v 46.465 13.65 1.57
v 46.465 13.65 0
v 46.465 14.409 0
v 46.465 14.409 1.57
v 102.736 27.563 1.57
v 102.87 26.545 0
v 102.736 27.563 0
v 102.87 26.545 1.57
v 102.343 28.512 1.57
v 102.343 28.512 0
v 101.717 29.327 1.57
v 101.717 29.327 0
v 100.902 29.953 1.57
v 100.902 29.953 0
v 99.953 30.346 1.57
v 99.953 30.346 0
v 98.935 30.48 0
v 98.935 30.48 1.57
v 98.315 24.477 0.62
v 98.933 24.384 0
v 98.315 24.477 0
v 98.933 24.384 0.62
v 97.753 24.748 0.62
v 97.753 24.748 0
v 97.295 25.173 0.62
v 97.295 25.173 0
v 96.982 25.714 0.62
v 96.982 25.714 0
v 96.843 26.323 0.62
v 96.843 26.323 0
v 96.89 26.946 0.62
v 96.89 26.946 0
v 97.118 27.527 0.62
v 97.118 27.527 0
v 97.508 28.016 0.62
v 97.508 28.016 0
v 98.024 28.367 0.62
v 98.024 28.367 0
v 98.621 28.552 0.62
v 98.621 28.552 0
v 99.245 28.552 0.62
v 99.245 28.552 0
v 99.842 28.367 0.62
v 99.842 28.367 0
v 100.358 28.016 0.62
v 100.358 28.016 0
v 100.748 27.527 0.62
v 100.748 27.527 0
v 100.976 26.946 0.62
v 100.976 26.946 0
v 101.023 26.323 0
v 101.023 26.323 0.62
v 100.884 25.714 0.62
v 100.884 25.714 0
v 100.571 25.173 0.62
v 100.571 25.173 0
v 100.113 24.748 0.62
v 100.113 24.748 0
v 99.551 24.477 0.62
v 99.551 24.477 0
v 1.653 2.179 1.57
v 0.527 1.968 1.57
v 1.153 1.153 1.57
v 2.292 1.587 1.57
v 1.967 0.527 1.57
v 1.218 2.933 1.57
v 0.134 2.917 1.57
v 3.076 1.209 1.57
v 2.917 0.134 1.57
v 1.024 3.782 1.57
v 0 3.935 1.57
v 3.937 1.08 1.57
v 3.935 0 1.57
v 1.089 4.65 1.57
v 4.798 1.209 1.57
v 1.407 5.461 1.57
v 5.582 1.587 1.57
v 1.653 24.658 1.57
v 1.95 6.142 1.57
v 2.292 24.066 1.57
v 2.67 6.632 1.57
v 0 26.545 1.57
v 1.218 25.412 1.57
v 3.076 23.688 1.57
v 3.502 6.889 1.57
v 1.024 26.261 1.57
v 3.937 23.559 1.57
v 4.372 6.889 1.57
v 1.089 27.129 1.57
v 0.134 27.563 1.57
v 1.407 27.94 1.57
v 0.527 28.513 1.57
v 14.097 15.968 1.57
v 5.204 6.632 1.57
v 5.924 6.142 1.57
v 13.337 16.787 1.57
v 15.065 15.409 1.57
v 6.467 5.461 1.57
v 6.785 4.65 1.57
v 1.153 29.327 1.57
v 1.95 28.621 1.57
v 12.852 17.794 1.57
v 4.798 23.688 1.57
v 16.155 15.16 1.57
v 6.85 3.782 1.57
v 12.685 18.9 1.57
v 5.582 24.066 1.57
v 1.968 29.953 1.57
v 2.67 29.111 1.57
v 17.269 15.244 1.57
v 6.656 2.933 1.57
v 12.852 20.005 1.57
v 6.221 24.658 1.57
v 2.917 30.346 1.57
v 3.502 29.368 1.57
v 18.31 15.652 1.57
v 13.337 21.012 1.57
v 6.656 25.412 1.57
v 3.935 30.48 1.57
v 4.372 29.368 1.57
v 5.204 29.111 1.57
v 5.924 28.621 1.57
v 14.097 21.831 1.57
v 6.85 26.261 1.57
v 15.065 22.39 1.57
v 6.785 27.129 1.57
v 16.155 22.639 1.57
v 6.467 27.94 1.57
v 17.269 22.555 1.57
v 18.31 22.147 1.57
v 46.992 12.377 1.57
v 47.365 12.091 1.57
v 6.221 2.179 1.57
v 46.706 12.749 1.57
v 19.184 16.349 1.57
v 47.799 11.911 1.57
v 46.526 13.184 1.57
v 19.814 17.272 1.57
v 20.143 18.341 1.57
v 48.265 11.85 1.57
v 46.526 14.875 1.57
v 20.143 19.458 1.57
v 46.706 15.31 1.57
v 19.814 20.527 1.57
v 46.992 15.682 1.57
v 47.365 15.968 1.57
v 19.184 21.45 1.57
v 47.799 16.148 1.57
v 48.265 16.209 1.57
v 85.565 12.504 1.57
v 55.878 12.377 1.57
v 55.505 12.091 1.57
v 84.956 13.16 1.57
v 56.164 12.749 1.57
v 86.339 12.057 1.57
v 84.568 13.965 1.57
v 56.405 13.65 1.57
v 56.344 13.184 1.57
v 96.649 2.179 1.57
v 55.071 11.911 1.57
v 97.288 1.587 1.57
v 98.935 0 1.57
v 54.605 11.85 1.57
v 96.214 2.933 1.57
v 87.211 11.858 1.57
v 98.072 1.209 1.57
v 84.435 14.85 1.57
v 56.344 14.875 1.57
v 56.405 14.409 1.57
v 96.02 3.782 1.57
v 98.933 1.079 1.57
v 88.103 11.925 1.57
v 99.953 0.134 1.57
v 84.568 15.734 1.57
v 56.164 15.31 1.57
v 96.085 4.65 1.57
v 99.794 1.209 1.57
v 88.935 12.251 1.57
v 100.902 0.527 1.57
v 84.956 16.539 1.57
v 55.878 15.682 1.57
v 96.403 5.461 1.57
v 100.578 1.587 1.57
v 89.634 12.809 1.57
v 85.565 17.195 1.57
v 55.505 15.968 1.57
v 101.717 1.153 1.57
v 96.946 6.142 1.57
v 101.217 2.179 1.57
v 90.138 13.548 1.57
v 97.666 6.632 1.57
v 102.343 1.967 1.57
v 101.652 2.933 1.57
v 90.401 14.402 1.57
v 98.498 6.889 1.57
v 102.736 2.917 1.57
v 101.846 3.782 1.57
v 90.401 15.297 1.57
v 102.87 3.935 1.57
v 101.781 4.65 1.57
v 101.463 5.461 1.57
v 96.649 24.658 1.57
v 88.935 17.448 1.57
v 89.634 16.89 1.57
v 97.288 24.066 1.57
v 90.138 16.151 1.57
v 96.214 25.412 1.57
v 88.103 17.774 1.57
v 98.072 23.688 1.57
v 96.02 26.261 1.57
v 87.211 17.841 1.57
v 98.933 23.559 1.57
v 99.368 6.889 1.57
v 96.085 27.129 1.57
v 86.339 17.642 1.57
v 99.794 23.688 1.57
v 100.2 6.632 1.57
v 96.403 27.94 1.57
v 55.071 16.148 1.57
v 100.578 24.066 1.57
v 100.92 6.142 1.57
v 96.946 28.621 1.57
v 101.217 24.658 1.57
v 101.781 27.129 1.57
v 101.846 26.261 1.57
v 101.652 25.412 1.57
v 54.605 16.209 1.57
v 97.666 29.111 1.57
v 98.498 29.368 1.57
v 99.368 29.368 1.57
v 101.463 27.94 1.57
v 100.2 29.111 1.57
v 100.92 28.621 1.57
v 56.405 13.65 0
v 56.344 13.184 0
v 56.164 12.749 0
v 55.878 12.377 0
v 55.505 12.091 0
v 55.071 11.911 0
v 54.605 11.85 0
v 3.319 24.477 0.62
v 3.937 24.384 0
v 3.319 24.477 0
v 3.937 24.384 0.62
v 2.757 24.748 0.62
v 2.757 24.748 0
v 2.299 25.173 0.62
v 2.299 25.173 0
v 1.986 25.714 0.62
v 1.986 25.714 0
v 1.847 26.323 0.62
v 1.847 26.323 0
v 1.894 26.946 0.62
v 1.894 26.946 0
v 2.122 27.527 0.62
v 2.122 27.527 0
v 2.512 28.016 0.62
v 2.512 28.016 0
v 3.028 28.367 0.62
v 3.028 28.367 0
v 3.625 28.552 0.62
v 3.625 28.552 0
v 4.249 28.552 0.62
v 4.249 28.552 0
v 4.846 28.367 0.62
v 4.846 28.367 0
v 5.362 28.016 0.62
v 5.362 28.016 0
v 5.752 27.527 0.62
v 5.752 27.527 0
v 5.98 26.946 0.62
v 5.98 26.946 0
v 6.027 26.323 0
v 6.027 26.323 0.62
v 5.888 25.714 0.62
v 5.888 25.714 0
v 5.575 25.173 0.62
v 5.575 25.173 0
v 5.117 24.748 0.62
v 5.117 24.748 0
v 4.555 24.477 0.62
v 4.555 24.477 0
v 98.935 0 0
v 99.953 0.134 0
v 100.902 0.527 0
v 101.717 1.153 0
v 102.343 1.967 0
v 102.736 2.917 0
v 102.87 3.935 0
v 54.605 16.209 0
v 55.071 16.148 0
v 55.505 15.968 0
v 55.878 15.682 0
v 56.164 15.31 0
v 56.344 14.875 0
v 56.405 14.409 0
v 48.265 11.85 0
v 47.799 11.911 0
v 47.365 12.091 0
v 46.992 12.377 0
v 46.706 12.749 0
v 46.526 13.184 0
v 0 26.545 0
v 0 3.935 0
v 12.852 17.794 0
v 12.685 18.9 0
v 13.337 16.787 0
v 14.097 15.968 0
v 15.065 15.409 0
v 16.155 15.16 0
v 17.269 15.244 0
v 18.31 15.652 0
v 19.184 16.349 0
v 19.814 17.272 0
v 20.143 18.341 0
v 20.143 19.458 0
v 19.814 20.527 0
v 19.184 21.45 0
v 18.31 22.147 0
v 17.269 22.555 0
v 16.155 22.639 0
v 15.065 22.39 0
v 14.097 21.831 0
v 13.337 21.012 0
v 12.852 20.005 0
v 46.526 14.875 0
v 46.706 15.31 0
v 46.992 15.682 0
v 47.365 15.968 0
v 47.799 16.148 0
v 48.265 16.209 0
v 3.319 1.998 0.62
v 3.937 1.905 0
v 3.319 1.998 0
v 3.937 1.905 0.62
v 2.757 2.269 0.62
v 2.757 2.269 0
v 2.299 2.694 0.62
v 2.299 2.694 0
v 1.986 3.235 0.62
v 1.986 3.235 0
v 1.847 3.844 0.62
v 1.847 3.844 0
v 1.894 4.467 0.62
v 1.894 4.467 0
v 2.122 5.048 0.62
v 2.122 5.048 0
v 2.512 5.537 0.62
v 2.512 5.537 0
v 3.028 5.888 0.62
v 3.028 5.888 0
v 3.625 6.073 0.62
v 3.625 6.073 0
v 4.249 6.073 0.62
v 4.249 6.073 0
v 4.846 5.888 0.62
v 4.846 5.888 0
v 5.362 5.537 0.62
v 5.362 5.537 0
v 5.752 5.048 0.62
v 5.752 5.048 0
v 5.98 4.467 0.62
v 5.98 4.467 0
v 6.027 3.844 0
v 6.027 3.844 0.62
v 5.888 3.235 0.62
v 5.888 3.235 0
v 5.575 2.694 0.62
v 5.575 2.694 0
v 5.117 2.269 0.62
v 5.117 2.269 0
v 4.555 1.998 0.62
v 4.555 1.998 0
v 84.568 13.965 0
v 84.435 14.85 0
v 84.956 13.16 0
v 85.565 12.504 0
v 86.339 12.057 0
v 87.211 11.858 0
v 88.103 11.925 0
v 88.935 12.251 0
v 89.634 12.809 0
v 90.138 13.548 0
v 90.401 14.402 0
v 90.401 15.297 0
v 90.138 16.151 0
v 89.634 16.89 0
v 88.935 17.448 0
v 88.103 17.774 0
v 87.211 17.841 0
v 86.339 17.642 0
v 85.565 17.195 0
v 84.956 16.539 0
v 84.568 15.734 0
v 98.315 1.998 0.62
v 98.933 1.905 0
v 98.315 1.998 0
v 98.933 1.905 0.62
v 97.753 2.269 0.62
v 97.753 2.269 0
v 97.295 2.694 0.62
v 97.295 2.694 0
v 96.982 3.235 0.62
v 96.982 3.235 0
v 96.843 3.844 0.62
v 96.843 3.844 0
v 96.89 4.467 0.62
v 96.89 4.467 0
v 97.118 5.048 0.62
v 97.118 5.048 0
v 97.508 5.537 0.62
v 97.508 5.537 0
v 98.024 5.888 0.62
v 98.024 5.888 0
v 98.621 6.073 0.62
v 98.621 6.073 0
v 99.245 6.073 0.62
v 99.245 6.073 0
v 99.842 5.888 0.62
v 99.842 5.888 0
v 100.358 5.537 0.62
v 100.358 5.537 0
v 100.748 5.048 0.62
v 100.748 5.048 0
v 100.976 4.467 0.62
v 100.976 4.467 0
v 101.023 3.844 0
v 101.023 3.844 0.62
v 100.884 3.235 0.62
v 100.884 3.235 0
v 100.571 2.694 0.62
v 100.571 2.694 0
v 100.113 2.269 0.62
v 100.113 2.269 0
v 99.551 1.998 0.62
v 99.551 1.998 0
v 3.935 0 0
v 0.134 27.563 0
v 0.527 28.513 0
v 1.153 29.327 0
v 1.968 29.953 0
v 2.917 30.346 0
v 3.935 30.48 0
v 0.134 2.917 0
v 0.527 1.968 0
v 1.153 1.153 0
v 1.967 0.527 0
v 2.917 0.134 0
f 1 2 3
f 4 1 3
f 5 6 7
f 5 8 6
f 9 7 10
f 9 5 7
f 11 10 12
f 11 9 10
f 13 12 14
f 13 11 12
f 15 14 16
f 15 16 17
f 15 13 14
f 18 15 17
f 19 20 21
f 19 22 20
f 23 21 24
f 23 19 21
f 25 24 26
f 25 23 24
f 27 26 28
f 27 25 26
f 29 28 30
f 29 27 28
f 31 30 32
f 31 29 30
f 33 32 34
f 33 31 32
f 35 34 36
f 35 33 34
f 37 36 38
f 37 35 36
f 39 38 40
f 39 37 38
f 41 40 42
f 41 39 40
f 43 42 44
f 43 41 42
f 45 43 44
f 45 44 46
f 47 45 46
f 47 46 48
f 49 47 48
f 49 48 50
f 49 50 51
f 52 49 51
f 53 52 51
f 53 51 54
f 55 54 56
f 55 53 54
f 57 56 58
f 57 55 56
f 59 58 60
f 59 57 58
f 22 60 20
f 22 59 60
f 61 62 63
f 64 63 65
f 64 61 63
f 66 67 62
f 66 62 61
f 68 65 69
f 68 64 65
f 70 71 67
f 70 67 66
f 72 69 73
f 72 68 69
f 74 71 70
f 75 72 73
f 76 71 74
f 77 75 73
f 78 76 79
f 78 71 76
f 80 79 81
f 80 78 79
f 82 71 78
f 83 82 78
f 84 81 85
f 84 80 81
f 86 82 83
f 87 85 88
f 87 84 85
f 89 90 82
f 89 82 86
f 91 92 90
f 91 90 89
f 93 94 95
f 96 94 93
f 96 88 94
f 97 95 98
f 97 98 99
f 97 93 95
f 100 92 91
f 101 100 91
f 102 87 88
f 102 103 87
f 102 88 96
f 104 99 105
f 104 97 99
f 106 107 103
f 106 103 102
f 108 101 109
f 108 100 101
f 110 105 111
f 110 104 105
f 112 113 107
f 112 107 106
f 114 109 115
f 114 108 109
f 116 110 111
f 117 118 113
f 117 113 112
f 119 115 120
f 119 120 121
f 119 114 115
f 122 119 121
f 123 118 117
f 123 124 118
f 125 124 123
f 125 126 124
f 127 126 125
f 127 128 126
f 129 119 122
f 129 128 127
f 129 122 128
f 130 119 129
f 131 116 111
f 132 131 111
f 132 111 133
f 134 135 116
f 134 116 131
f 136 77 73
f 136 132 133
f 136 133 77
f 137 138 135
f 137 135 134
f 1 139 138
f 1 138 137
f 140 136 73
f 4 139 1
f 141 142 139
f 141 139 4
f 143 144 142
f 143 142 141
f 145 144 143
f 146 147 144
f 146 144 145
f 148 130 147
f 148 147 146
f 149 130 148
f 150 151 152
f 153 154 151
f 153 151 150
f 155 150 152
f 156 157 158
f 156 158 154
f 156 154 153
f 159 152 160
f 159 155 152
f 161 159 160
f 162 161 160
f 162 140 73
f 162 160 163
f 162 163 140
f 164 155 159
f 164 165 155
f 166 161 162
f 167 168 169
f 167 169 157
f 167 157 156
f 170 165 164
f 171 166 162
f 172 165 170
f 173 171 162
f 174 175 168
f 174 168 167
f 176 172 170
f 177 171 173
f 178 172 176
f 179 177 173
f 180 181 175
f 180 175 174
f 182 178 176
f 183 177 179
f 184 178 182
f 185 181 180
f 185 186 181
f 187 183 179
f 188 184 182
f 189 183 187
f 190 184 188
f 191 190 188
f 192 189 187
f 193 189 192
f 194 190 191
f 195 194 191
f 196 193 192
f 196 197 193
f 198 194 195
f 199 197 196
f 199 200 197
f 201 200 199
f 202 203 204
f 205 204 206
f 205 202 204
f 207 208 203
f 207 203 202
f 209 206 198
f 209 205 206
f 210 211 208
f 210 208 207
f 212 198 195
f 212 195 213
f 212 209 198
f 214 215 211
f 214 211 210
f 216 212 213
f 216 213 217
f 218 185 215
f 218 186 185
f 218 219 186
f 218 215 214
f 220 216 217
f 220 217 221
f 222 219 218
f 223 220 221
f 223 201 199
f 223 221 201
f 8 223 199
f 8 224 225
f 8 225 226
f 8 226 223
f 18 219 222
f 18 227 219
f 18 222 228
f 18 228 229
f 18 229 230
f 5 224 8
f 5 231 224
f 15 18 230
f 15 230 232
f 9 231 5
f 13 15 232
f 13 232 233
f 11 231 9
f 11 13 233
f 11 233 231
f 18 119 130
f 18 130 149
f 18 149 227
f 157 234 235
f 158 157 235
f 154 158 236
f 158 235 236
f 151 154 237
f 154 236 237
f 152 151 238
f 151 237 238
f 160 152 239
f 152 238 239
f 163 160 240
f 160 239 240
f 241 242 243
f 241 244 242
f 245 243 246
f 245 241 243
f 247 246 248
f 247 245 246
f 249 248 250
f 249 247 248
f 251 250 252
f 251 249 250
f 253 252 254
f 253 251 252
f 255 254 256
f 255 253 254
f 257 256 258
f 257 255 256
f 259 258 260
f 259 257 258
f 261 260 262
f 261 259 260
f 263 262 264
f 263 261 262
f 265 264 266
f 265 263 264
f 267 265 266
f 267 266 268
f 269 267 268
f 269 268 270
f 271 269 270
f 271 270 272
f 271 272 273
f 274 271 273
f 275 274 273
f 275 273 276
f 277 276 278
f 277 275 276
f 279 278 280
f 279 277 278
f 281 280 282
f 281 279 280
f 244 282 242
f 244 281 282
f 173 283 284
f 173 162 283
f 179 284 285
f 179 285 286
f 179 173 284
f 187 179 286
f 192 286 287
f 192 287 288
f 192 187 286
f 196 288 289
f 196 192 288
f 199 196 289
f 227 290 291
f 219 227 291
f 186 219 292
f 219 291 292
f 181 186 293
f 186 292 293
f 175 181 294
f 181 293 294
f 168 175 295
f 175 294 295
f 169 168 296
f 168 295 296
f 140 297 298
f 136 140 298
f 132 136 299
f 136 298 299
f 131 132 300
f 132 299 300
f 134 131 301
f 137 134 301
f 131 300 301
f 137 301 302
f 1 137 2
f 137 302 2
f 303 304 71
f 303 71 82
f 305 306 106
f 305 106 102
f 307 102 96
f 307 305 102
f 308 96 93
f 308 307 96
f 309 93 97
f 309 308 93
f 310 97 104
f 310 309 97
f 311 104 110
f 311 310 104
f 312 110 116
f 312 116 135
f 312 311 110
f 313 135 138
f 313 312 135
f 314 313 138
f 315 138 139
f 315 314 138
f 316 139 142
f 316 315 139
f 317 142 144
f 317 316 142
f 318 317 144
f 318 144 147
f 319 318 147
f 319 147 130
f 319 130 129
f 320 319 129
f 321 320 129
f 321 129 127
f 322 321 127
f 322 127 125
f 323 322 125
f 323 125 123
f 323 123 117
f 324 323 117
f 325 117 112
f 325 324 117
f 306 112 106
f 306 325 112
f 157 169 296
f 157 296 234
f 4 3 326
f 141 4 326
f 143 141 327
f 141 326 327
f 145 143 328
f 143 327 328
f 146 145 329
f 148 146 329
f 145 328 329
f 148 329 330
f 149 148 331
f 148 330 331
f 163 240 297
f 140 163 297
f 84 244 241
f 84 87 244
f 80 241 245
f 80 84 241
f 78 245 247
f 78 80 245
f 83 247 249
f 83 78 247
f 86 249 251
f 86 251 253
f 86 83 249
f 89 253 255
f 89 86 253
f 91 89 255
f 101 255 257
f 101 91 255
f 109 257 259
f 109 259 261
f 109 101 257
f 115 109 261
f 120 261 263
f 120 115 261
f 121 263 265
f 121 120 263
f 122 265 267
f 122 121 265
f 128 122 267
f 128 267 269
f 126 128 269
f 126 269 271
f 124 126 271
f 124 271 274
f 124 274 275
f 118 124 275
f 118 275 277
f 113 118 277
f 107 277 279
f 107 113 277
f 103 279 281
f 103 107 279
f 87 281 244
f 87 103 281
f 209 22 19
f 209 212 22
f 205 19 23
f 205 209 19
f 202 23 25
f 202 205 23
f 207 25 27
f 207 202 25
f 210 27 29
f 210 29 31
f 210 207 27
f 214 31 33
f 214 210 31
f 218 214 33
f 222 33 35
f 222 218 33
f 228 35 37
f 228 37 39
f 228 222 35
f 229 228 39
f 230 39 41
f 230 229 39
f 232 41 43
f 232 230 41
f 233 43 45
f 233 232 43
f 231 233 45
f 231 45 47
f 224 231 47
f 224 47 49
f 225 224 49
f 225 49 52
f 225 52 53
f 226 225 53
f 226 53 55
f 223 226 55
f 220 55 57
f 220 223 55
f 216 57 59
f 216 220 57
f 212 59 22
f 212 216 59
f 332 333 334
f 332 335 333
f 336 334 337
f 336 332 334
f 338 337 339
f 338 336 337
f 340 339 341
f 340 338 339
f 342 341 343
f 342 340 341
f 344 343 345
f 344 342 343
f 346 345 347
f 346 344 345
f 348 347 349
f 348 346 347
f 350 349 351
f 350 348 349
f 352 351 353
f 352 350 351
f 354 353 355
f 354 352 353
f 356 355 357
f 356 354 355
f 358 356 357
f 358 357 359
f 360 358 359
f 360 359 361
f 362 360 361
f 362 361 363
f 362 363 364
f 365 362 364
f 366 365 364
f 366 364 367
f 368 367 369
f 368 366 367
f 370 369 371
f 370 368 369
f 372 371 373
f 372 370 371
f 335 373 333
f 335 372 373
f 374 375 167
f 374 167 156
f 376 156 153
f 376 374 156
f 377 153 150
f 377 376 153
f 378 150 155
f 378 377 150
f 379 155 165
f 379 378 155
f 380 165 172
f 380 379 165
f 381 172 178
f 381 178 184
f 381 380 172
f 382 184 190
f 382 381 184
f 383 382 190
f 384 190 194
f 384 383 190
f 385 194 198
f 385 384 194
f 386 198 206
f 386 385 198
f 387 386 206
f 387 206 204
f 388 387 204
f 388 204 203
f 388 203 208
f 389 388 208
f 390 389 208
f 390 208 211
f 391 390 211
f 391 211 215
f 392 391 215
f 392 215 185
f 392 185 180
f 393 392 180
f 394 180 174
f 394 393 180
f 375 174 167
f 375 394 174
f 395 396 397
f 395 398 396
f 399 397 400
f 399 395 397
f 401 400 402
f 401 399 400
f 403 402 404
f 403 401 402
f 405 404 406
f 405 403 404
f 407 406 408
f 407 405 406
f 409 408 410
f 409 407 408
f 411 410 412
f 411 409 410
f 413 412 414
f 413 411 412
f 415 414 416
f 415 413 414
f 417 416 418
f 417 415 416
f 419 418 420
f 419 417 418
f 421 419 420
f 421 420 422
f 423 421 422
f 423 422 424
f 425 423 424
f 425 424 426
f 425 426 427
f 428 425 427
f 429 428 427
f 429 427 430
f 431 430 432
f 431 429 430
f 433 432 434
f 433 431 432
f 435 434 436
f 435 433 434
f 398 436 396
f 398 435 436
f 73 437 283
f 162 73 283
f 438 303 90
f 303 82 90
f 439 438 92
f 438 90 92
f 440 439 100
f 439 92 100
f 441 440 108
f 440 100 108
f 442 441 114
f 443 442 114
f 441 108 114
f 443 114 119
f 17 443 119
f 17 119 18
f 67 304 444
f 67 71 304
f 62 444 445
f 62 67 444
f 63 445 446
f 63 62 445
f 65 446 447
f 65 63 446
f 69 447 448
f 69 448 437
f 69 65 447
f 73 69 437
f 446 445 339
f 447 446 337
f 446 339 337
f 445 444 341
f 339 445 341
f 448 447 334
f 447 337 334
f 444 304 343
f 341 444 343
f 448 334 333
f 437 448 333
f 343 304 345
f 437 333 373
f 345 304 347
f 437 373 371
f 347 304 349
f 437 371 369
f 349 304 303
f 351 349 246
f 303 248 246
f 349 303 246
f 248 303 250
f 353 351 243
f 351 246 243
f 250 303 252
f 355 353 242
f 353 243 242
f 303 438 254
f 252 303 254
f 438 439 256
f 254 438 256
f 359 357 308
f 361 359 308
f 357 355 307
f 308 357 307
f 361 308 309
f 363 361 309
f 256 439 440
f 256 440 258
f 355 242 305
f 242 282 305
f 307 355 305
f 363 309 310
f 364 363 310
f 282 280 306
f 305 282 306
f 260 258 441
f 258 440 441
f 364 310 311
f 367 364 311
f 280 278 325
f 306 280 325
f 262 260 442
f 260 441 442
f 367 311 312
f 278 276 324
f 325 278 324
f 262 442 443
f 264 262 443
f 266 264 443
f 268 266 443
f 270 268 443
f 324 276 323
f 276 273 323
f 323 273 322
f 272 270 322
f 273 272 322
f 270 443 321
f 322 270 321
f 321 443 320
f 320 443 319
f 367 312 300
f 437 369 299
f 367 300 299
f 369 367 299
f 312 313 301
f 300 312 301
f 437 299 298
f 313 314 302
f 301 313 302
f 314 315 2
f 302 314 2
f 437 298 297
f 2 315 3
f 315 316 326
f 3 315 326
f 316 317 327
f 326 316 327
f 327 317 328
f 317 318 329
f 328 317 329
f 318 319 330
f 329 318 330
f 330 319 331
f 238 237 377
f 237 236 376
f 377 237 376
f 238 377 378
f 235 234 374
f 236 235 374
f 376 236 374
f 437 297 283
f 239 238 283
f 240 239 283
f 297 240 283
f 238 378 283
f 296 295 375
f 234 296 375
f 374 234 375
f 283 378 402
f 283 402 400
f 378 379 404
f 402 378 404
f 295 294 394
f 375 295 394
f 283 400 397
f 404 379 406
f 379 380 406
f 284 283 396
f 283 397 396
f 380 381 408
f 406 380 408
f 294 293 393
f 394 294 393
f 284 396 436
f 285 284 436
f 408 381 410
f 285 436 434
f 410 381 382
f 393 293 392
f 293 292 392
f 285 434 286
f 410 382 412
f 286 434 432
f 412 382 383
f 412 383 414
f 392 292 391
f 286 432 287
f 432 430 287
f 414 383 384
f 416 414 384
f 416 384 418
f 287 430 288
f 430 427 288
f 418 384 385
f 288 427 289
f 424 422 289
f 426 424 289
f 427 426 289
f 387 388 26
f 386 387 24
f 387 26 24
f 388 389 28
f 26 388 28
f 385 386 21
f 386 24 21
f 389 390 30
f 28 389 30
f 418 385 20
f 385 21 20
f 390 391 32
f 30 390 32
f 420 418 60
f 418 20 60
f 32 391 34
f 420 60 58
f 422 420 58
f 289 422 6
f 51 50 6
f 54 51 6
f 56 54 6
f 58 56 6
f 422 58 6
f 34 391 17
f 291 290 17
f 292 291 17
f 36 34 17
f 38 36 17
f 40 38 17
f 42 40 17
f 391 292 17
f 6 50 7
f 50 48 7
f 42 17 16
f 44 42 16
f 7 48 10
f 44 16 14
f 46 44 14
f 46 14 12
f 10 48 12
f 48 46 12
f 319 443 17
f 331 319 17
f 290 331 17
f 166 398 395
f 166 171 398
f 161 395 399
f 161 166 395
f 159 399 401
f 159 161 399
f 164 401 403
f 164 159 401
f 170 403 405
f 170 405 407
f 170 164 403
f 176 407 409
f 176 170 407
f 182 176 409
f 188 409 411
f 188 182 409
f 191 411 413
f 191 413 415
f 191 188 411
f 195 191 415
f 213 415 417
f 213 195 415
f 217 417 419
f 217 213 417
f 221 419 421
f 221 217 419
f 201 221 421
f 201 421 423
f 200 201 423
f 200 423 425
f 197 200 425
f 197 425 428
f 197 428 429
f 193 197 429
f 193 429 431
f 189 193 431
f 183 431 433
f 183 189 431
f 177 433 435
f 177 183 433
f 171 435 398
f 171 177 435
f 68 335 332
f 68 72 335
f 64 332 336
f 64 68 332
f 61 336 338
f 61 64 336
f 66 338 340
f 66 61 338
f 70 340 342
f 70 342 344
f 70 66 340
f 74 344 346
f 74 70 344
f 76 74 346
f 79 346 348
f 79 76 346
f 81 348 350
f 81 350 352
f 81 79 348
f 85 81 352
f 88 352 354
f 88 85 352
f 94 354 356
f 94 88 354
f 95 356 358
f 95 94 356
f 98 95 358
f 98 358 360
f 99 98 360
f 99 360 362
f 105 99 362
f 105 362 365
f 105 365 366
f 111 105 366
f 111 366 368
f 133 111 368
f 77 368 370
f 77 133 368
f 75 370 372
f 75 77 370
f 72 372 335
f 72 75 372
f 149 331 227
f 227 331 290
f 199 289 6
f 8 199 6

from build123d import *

# Parameters (mm, degrees)
SKETCH1_W                                     = 102.87
SKETCH1_H                                     = 30.48
BOSS_EXTRUDE1_DEPTH                           = 1.57
FILLET1_R                                     = 3.935
CSK_FOR_6_FLAT_HEAD_MACHINE_SCREW1_AT_2_COUNT = 2
CSK_FOR_6_FLAT_HEAD_MACHINE_SCREW1_AT_2_PITCH = 22.479
CSK_FOR_6_FLAT_HEAD_MACHINE_SCREW1_AT_3_COUNT = 2
CSK_FOR_6_FLAT_HEAD_MACHINE_SCREW1_AT_3_PITCH = 94.996
CSK_FOR_6_FLAT_HEAD_MACHINE_SCREW1_AT_4_COUNT = 2
CSK_FOR_6_FLAT_HEAD_MACHINE_SCREW1_AT_4_PITCH = 97.619390784
DATA_SIDE_R                                   = 3.25
DATA_SIDE_R_2                                 = 2.5
CUT_EXTRUDE9_DEPTH                            = 1.57
MOVE_FACE4_BY                                 = 0.5
MOVE_FACE4_2_BY                               = 0.5
MOVE_FACE4_3_BY                               = 0.5
MOVE_FACE4_4_BY                               = 0.5
MOVE_FACE4_5_BY                               = 0.5
MOVE_FACE4_6_BY                               = 0.5
MOVE_FACE4_7_BY                               = 0.5
MOVE_FACE4_8_BY                               = 0.5
MOVE_FACE4_9_BY                               = 0.5
MOVE_FACE4_10_BY                              = 0.5


with BuildPart() as part:
    # Sketch1 → Boss-Extrude1 (new body)
    with BuildSketch(Plane.XY):
        with Locations((51.435, 15.24)):
            Rectangle(SKETCH1_W, SKETCH1_H)
    extrude(amount=BOSS_EXTRUDE1_DEPTH)

    # Fillet1
    fillet1_edges = [part.edges().sort_by_distance(p)[0] for p in [
        (0, 30.48, 0.785),
        (102.87, 30.48, 0.785),
        (102.87, 0, 0.785),
        (0, 0, 0.785),
    ]]
    fillet(fillet1_edges, radius=FILLET1_R)

    # Sketch4 → CSK for #6 Flat Head Machine Screw1 (revolve, cut)
    with BuildSketch(Plane(origin=(3.937, 26.4795, 1.57), x_dir=(0, -1, 0), z_dir=(1, 0, 0))):
        Polygon((0, 0), (0, 1.57), (2.0955, 1.57), (2.0955, 0.94962912), (2.921, 0), align=None)
    csk_for_6_flat_head_machine_screw1 = revolve(axis=Axis((3.937, 26.4795, 7.92), (0, 0, -1)), mode=Mode.SUBTRACT)

    # CSK for #6 Flat Head Machine Screw1 at 2: CSK for #6 Flat Head Machine Screw1 ×2
    with Locations(*[(0, -i * CSK_FOR_6_FLAT_HEAD_MACHINE_SCREW1_AT_2_PITCH, 0) for i in range(1, CSK_FOR_6_FLAT_HEAD_MACHINE_SCREW1_AT_2_COUNT)]):
        add(csk_for_6_flat_head_machine_screw1, mode=Mode.SUBTRACT)

    # CSK for #6 Flat Head Machine Screw1 at 3: CSK for #6 Flat Head Machine Screw1 ×2
    with Locations(*[(i * CSK_FOR_6_FLAT_HEAD_MACHINE_SCREW1_AT_3_PITCH, 0, 0) for i in range(1, CSK_FOR_6_FLAT_HEAD_MACHINE_SCREW1_AT_3_COUNT)]):
        add(csk_for_6_flat_head_machine_screw1, mode=Mode.SUBTRACT)

    # CSK for #6 Flat Head Machine Screw1 at 4: CSK for #6 Flat Head Machine Screw1 ×2
    with Locations(*[Vector(0.9731263352215668, -0.23027187344146696, 0) * (i * CSK_FOR_6_FLAT_HEAD_MACHINE_SCREW1_AT_4_PITCH) for i in range(1, CSK_FOR_6_FLAT_HEAD_MACHINE_SCREW1_AT_4_COUNT)]):
        add(csk_for_6_flat_head_machine_screw1, mode=Mode.SUBTRACT)

    # data side → Cut-Extrude9 (cut)
    with BuildSketch(Plane.XY):
        with Locations(Location((16.435, 18.8995, 0), (0, 0, 180))):
            Circle(DATA_SIDE_R)
        with Locations(Location((87.435, 14.8495, 0), (0, 0, 180))):
            Circle(DATA_SIDE_R_2)
        with BuildLine():
            Line((48.265, 15.7095), (54.605, 15.7095))
            ThreePointArc((54.605, 15.7095), (55.524238816, 15.328738816), (55.905, 14.4095))
            Line((55.905, 14.4095), (55.905, 13.6495))
            ThreePointArc((55.905, 13.6495), (55.524238816, 12.730261184), (54.605, 12.3495))
            Line((54.605, 12.3495), (48.265, 12.3495))
            ThreePointArc((48.265, 12.3495), (47.345761184, 12.730261184), (46.965, 13.6495))
            Line((46.965, 13.6495), (46.965, 14.4095))
            ThreePointArc((46.965, 14.4095), (47.345761184, 15.328738816), (48.265, 15.7095))
        make_face()
    extrude(amount=CUT_EXTRUDE9_DEPTH, mode=Mode.SUBTRACT)

    # Move Face4: a curved face moved inward by 0.5
    add(Solid.thicken(part.faces().sort_by_distance((89.935, 14.8495, 0.785))[0], -MOVE_FACE4_BY), mode=Mode.SUBTRACT)

    # Move Face4 2: a curved face moved inward by 0.5
    add(Solid.thicken(part.faces().sort_by_distance((19.685, 18.8995, 0.785))[0], -MOVE_FACE4_2_BY), mode=Mode.SUBTRACT)

    # Move Face4 3: a curved face moved inward by 0.5
    add(Solid.thicken(part.faces().sort_by_distance((55.524238816, 12.730261184, 0.785))[0], -MOVE_FACE4_3_BY), mode=Mode.SUBTRACT)

    # Move Face4 4: a curved face moved inward by 0.5
    add(Solid.thicken(part.faces().sort_by_distance((55.524238816, 15.328738816, 0.785))[0], -MOVE_FACE4_4_BY), mode=Mode.SUBTRACT)

    # Move Face4 5: a face moved inward by 0.5
    extrude(part.faces().sort_by_distance((55.905, 14.0295, 0.785))[0], amount=MOVE_FACE4_5_BY, dir=(1, 0, 0), mode=Mode.SUBTRACT)

    # Move Face4 6: a face moved inward by 0.5
    extrude(part.faces().sort_by_distance((51.435, 12.3495, 0.785))[0], amount=MOVE_FACE4_6_BY, dir=(0, -1, 0), mode=Mode.SUBTRACT)

    # Move Face4 7: a curved face moved inward by 0.5
    add(Solid.thicken(part.faces().sort_by_distance((47.345761184, 12.730261184, 0.785))[0], -MOVE_FACE4_7_BY), mode=Mode.SUBTRACT)

    # Move Face4 8: a face moved inward by 0.5
    extrude(part.faces().sort_by_distance((46.965, 14.0295, 0.785))[0], amount=MOVE_FACE4_8_BY, dir=(-1, 0, 0), mode=Mode.SUBTRACT)

    # Move Face4 9: a face moved inward by 0.5
    extrude(part.faces().sort_by_distance((51.435, 15.7095, 0.785))[0], amount=MOVE_FACE4_9_BY, dir=(0, 1, 0), mode=Mode.SUBTRACT)

    # Move Face4 10: a curved face moved inward by 0.5
    add(Solid.thicken(part.faces().sort_by_distance((47.345761184, 15.328738816, 0.785))[0], -MOVE_FACE4_10_BY), mode=Mode.SUBTRACT)


solid = part.part
